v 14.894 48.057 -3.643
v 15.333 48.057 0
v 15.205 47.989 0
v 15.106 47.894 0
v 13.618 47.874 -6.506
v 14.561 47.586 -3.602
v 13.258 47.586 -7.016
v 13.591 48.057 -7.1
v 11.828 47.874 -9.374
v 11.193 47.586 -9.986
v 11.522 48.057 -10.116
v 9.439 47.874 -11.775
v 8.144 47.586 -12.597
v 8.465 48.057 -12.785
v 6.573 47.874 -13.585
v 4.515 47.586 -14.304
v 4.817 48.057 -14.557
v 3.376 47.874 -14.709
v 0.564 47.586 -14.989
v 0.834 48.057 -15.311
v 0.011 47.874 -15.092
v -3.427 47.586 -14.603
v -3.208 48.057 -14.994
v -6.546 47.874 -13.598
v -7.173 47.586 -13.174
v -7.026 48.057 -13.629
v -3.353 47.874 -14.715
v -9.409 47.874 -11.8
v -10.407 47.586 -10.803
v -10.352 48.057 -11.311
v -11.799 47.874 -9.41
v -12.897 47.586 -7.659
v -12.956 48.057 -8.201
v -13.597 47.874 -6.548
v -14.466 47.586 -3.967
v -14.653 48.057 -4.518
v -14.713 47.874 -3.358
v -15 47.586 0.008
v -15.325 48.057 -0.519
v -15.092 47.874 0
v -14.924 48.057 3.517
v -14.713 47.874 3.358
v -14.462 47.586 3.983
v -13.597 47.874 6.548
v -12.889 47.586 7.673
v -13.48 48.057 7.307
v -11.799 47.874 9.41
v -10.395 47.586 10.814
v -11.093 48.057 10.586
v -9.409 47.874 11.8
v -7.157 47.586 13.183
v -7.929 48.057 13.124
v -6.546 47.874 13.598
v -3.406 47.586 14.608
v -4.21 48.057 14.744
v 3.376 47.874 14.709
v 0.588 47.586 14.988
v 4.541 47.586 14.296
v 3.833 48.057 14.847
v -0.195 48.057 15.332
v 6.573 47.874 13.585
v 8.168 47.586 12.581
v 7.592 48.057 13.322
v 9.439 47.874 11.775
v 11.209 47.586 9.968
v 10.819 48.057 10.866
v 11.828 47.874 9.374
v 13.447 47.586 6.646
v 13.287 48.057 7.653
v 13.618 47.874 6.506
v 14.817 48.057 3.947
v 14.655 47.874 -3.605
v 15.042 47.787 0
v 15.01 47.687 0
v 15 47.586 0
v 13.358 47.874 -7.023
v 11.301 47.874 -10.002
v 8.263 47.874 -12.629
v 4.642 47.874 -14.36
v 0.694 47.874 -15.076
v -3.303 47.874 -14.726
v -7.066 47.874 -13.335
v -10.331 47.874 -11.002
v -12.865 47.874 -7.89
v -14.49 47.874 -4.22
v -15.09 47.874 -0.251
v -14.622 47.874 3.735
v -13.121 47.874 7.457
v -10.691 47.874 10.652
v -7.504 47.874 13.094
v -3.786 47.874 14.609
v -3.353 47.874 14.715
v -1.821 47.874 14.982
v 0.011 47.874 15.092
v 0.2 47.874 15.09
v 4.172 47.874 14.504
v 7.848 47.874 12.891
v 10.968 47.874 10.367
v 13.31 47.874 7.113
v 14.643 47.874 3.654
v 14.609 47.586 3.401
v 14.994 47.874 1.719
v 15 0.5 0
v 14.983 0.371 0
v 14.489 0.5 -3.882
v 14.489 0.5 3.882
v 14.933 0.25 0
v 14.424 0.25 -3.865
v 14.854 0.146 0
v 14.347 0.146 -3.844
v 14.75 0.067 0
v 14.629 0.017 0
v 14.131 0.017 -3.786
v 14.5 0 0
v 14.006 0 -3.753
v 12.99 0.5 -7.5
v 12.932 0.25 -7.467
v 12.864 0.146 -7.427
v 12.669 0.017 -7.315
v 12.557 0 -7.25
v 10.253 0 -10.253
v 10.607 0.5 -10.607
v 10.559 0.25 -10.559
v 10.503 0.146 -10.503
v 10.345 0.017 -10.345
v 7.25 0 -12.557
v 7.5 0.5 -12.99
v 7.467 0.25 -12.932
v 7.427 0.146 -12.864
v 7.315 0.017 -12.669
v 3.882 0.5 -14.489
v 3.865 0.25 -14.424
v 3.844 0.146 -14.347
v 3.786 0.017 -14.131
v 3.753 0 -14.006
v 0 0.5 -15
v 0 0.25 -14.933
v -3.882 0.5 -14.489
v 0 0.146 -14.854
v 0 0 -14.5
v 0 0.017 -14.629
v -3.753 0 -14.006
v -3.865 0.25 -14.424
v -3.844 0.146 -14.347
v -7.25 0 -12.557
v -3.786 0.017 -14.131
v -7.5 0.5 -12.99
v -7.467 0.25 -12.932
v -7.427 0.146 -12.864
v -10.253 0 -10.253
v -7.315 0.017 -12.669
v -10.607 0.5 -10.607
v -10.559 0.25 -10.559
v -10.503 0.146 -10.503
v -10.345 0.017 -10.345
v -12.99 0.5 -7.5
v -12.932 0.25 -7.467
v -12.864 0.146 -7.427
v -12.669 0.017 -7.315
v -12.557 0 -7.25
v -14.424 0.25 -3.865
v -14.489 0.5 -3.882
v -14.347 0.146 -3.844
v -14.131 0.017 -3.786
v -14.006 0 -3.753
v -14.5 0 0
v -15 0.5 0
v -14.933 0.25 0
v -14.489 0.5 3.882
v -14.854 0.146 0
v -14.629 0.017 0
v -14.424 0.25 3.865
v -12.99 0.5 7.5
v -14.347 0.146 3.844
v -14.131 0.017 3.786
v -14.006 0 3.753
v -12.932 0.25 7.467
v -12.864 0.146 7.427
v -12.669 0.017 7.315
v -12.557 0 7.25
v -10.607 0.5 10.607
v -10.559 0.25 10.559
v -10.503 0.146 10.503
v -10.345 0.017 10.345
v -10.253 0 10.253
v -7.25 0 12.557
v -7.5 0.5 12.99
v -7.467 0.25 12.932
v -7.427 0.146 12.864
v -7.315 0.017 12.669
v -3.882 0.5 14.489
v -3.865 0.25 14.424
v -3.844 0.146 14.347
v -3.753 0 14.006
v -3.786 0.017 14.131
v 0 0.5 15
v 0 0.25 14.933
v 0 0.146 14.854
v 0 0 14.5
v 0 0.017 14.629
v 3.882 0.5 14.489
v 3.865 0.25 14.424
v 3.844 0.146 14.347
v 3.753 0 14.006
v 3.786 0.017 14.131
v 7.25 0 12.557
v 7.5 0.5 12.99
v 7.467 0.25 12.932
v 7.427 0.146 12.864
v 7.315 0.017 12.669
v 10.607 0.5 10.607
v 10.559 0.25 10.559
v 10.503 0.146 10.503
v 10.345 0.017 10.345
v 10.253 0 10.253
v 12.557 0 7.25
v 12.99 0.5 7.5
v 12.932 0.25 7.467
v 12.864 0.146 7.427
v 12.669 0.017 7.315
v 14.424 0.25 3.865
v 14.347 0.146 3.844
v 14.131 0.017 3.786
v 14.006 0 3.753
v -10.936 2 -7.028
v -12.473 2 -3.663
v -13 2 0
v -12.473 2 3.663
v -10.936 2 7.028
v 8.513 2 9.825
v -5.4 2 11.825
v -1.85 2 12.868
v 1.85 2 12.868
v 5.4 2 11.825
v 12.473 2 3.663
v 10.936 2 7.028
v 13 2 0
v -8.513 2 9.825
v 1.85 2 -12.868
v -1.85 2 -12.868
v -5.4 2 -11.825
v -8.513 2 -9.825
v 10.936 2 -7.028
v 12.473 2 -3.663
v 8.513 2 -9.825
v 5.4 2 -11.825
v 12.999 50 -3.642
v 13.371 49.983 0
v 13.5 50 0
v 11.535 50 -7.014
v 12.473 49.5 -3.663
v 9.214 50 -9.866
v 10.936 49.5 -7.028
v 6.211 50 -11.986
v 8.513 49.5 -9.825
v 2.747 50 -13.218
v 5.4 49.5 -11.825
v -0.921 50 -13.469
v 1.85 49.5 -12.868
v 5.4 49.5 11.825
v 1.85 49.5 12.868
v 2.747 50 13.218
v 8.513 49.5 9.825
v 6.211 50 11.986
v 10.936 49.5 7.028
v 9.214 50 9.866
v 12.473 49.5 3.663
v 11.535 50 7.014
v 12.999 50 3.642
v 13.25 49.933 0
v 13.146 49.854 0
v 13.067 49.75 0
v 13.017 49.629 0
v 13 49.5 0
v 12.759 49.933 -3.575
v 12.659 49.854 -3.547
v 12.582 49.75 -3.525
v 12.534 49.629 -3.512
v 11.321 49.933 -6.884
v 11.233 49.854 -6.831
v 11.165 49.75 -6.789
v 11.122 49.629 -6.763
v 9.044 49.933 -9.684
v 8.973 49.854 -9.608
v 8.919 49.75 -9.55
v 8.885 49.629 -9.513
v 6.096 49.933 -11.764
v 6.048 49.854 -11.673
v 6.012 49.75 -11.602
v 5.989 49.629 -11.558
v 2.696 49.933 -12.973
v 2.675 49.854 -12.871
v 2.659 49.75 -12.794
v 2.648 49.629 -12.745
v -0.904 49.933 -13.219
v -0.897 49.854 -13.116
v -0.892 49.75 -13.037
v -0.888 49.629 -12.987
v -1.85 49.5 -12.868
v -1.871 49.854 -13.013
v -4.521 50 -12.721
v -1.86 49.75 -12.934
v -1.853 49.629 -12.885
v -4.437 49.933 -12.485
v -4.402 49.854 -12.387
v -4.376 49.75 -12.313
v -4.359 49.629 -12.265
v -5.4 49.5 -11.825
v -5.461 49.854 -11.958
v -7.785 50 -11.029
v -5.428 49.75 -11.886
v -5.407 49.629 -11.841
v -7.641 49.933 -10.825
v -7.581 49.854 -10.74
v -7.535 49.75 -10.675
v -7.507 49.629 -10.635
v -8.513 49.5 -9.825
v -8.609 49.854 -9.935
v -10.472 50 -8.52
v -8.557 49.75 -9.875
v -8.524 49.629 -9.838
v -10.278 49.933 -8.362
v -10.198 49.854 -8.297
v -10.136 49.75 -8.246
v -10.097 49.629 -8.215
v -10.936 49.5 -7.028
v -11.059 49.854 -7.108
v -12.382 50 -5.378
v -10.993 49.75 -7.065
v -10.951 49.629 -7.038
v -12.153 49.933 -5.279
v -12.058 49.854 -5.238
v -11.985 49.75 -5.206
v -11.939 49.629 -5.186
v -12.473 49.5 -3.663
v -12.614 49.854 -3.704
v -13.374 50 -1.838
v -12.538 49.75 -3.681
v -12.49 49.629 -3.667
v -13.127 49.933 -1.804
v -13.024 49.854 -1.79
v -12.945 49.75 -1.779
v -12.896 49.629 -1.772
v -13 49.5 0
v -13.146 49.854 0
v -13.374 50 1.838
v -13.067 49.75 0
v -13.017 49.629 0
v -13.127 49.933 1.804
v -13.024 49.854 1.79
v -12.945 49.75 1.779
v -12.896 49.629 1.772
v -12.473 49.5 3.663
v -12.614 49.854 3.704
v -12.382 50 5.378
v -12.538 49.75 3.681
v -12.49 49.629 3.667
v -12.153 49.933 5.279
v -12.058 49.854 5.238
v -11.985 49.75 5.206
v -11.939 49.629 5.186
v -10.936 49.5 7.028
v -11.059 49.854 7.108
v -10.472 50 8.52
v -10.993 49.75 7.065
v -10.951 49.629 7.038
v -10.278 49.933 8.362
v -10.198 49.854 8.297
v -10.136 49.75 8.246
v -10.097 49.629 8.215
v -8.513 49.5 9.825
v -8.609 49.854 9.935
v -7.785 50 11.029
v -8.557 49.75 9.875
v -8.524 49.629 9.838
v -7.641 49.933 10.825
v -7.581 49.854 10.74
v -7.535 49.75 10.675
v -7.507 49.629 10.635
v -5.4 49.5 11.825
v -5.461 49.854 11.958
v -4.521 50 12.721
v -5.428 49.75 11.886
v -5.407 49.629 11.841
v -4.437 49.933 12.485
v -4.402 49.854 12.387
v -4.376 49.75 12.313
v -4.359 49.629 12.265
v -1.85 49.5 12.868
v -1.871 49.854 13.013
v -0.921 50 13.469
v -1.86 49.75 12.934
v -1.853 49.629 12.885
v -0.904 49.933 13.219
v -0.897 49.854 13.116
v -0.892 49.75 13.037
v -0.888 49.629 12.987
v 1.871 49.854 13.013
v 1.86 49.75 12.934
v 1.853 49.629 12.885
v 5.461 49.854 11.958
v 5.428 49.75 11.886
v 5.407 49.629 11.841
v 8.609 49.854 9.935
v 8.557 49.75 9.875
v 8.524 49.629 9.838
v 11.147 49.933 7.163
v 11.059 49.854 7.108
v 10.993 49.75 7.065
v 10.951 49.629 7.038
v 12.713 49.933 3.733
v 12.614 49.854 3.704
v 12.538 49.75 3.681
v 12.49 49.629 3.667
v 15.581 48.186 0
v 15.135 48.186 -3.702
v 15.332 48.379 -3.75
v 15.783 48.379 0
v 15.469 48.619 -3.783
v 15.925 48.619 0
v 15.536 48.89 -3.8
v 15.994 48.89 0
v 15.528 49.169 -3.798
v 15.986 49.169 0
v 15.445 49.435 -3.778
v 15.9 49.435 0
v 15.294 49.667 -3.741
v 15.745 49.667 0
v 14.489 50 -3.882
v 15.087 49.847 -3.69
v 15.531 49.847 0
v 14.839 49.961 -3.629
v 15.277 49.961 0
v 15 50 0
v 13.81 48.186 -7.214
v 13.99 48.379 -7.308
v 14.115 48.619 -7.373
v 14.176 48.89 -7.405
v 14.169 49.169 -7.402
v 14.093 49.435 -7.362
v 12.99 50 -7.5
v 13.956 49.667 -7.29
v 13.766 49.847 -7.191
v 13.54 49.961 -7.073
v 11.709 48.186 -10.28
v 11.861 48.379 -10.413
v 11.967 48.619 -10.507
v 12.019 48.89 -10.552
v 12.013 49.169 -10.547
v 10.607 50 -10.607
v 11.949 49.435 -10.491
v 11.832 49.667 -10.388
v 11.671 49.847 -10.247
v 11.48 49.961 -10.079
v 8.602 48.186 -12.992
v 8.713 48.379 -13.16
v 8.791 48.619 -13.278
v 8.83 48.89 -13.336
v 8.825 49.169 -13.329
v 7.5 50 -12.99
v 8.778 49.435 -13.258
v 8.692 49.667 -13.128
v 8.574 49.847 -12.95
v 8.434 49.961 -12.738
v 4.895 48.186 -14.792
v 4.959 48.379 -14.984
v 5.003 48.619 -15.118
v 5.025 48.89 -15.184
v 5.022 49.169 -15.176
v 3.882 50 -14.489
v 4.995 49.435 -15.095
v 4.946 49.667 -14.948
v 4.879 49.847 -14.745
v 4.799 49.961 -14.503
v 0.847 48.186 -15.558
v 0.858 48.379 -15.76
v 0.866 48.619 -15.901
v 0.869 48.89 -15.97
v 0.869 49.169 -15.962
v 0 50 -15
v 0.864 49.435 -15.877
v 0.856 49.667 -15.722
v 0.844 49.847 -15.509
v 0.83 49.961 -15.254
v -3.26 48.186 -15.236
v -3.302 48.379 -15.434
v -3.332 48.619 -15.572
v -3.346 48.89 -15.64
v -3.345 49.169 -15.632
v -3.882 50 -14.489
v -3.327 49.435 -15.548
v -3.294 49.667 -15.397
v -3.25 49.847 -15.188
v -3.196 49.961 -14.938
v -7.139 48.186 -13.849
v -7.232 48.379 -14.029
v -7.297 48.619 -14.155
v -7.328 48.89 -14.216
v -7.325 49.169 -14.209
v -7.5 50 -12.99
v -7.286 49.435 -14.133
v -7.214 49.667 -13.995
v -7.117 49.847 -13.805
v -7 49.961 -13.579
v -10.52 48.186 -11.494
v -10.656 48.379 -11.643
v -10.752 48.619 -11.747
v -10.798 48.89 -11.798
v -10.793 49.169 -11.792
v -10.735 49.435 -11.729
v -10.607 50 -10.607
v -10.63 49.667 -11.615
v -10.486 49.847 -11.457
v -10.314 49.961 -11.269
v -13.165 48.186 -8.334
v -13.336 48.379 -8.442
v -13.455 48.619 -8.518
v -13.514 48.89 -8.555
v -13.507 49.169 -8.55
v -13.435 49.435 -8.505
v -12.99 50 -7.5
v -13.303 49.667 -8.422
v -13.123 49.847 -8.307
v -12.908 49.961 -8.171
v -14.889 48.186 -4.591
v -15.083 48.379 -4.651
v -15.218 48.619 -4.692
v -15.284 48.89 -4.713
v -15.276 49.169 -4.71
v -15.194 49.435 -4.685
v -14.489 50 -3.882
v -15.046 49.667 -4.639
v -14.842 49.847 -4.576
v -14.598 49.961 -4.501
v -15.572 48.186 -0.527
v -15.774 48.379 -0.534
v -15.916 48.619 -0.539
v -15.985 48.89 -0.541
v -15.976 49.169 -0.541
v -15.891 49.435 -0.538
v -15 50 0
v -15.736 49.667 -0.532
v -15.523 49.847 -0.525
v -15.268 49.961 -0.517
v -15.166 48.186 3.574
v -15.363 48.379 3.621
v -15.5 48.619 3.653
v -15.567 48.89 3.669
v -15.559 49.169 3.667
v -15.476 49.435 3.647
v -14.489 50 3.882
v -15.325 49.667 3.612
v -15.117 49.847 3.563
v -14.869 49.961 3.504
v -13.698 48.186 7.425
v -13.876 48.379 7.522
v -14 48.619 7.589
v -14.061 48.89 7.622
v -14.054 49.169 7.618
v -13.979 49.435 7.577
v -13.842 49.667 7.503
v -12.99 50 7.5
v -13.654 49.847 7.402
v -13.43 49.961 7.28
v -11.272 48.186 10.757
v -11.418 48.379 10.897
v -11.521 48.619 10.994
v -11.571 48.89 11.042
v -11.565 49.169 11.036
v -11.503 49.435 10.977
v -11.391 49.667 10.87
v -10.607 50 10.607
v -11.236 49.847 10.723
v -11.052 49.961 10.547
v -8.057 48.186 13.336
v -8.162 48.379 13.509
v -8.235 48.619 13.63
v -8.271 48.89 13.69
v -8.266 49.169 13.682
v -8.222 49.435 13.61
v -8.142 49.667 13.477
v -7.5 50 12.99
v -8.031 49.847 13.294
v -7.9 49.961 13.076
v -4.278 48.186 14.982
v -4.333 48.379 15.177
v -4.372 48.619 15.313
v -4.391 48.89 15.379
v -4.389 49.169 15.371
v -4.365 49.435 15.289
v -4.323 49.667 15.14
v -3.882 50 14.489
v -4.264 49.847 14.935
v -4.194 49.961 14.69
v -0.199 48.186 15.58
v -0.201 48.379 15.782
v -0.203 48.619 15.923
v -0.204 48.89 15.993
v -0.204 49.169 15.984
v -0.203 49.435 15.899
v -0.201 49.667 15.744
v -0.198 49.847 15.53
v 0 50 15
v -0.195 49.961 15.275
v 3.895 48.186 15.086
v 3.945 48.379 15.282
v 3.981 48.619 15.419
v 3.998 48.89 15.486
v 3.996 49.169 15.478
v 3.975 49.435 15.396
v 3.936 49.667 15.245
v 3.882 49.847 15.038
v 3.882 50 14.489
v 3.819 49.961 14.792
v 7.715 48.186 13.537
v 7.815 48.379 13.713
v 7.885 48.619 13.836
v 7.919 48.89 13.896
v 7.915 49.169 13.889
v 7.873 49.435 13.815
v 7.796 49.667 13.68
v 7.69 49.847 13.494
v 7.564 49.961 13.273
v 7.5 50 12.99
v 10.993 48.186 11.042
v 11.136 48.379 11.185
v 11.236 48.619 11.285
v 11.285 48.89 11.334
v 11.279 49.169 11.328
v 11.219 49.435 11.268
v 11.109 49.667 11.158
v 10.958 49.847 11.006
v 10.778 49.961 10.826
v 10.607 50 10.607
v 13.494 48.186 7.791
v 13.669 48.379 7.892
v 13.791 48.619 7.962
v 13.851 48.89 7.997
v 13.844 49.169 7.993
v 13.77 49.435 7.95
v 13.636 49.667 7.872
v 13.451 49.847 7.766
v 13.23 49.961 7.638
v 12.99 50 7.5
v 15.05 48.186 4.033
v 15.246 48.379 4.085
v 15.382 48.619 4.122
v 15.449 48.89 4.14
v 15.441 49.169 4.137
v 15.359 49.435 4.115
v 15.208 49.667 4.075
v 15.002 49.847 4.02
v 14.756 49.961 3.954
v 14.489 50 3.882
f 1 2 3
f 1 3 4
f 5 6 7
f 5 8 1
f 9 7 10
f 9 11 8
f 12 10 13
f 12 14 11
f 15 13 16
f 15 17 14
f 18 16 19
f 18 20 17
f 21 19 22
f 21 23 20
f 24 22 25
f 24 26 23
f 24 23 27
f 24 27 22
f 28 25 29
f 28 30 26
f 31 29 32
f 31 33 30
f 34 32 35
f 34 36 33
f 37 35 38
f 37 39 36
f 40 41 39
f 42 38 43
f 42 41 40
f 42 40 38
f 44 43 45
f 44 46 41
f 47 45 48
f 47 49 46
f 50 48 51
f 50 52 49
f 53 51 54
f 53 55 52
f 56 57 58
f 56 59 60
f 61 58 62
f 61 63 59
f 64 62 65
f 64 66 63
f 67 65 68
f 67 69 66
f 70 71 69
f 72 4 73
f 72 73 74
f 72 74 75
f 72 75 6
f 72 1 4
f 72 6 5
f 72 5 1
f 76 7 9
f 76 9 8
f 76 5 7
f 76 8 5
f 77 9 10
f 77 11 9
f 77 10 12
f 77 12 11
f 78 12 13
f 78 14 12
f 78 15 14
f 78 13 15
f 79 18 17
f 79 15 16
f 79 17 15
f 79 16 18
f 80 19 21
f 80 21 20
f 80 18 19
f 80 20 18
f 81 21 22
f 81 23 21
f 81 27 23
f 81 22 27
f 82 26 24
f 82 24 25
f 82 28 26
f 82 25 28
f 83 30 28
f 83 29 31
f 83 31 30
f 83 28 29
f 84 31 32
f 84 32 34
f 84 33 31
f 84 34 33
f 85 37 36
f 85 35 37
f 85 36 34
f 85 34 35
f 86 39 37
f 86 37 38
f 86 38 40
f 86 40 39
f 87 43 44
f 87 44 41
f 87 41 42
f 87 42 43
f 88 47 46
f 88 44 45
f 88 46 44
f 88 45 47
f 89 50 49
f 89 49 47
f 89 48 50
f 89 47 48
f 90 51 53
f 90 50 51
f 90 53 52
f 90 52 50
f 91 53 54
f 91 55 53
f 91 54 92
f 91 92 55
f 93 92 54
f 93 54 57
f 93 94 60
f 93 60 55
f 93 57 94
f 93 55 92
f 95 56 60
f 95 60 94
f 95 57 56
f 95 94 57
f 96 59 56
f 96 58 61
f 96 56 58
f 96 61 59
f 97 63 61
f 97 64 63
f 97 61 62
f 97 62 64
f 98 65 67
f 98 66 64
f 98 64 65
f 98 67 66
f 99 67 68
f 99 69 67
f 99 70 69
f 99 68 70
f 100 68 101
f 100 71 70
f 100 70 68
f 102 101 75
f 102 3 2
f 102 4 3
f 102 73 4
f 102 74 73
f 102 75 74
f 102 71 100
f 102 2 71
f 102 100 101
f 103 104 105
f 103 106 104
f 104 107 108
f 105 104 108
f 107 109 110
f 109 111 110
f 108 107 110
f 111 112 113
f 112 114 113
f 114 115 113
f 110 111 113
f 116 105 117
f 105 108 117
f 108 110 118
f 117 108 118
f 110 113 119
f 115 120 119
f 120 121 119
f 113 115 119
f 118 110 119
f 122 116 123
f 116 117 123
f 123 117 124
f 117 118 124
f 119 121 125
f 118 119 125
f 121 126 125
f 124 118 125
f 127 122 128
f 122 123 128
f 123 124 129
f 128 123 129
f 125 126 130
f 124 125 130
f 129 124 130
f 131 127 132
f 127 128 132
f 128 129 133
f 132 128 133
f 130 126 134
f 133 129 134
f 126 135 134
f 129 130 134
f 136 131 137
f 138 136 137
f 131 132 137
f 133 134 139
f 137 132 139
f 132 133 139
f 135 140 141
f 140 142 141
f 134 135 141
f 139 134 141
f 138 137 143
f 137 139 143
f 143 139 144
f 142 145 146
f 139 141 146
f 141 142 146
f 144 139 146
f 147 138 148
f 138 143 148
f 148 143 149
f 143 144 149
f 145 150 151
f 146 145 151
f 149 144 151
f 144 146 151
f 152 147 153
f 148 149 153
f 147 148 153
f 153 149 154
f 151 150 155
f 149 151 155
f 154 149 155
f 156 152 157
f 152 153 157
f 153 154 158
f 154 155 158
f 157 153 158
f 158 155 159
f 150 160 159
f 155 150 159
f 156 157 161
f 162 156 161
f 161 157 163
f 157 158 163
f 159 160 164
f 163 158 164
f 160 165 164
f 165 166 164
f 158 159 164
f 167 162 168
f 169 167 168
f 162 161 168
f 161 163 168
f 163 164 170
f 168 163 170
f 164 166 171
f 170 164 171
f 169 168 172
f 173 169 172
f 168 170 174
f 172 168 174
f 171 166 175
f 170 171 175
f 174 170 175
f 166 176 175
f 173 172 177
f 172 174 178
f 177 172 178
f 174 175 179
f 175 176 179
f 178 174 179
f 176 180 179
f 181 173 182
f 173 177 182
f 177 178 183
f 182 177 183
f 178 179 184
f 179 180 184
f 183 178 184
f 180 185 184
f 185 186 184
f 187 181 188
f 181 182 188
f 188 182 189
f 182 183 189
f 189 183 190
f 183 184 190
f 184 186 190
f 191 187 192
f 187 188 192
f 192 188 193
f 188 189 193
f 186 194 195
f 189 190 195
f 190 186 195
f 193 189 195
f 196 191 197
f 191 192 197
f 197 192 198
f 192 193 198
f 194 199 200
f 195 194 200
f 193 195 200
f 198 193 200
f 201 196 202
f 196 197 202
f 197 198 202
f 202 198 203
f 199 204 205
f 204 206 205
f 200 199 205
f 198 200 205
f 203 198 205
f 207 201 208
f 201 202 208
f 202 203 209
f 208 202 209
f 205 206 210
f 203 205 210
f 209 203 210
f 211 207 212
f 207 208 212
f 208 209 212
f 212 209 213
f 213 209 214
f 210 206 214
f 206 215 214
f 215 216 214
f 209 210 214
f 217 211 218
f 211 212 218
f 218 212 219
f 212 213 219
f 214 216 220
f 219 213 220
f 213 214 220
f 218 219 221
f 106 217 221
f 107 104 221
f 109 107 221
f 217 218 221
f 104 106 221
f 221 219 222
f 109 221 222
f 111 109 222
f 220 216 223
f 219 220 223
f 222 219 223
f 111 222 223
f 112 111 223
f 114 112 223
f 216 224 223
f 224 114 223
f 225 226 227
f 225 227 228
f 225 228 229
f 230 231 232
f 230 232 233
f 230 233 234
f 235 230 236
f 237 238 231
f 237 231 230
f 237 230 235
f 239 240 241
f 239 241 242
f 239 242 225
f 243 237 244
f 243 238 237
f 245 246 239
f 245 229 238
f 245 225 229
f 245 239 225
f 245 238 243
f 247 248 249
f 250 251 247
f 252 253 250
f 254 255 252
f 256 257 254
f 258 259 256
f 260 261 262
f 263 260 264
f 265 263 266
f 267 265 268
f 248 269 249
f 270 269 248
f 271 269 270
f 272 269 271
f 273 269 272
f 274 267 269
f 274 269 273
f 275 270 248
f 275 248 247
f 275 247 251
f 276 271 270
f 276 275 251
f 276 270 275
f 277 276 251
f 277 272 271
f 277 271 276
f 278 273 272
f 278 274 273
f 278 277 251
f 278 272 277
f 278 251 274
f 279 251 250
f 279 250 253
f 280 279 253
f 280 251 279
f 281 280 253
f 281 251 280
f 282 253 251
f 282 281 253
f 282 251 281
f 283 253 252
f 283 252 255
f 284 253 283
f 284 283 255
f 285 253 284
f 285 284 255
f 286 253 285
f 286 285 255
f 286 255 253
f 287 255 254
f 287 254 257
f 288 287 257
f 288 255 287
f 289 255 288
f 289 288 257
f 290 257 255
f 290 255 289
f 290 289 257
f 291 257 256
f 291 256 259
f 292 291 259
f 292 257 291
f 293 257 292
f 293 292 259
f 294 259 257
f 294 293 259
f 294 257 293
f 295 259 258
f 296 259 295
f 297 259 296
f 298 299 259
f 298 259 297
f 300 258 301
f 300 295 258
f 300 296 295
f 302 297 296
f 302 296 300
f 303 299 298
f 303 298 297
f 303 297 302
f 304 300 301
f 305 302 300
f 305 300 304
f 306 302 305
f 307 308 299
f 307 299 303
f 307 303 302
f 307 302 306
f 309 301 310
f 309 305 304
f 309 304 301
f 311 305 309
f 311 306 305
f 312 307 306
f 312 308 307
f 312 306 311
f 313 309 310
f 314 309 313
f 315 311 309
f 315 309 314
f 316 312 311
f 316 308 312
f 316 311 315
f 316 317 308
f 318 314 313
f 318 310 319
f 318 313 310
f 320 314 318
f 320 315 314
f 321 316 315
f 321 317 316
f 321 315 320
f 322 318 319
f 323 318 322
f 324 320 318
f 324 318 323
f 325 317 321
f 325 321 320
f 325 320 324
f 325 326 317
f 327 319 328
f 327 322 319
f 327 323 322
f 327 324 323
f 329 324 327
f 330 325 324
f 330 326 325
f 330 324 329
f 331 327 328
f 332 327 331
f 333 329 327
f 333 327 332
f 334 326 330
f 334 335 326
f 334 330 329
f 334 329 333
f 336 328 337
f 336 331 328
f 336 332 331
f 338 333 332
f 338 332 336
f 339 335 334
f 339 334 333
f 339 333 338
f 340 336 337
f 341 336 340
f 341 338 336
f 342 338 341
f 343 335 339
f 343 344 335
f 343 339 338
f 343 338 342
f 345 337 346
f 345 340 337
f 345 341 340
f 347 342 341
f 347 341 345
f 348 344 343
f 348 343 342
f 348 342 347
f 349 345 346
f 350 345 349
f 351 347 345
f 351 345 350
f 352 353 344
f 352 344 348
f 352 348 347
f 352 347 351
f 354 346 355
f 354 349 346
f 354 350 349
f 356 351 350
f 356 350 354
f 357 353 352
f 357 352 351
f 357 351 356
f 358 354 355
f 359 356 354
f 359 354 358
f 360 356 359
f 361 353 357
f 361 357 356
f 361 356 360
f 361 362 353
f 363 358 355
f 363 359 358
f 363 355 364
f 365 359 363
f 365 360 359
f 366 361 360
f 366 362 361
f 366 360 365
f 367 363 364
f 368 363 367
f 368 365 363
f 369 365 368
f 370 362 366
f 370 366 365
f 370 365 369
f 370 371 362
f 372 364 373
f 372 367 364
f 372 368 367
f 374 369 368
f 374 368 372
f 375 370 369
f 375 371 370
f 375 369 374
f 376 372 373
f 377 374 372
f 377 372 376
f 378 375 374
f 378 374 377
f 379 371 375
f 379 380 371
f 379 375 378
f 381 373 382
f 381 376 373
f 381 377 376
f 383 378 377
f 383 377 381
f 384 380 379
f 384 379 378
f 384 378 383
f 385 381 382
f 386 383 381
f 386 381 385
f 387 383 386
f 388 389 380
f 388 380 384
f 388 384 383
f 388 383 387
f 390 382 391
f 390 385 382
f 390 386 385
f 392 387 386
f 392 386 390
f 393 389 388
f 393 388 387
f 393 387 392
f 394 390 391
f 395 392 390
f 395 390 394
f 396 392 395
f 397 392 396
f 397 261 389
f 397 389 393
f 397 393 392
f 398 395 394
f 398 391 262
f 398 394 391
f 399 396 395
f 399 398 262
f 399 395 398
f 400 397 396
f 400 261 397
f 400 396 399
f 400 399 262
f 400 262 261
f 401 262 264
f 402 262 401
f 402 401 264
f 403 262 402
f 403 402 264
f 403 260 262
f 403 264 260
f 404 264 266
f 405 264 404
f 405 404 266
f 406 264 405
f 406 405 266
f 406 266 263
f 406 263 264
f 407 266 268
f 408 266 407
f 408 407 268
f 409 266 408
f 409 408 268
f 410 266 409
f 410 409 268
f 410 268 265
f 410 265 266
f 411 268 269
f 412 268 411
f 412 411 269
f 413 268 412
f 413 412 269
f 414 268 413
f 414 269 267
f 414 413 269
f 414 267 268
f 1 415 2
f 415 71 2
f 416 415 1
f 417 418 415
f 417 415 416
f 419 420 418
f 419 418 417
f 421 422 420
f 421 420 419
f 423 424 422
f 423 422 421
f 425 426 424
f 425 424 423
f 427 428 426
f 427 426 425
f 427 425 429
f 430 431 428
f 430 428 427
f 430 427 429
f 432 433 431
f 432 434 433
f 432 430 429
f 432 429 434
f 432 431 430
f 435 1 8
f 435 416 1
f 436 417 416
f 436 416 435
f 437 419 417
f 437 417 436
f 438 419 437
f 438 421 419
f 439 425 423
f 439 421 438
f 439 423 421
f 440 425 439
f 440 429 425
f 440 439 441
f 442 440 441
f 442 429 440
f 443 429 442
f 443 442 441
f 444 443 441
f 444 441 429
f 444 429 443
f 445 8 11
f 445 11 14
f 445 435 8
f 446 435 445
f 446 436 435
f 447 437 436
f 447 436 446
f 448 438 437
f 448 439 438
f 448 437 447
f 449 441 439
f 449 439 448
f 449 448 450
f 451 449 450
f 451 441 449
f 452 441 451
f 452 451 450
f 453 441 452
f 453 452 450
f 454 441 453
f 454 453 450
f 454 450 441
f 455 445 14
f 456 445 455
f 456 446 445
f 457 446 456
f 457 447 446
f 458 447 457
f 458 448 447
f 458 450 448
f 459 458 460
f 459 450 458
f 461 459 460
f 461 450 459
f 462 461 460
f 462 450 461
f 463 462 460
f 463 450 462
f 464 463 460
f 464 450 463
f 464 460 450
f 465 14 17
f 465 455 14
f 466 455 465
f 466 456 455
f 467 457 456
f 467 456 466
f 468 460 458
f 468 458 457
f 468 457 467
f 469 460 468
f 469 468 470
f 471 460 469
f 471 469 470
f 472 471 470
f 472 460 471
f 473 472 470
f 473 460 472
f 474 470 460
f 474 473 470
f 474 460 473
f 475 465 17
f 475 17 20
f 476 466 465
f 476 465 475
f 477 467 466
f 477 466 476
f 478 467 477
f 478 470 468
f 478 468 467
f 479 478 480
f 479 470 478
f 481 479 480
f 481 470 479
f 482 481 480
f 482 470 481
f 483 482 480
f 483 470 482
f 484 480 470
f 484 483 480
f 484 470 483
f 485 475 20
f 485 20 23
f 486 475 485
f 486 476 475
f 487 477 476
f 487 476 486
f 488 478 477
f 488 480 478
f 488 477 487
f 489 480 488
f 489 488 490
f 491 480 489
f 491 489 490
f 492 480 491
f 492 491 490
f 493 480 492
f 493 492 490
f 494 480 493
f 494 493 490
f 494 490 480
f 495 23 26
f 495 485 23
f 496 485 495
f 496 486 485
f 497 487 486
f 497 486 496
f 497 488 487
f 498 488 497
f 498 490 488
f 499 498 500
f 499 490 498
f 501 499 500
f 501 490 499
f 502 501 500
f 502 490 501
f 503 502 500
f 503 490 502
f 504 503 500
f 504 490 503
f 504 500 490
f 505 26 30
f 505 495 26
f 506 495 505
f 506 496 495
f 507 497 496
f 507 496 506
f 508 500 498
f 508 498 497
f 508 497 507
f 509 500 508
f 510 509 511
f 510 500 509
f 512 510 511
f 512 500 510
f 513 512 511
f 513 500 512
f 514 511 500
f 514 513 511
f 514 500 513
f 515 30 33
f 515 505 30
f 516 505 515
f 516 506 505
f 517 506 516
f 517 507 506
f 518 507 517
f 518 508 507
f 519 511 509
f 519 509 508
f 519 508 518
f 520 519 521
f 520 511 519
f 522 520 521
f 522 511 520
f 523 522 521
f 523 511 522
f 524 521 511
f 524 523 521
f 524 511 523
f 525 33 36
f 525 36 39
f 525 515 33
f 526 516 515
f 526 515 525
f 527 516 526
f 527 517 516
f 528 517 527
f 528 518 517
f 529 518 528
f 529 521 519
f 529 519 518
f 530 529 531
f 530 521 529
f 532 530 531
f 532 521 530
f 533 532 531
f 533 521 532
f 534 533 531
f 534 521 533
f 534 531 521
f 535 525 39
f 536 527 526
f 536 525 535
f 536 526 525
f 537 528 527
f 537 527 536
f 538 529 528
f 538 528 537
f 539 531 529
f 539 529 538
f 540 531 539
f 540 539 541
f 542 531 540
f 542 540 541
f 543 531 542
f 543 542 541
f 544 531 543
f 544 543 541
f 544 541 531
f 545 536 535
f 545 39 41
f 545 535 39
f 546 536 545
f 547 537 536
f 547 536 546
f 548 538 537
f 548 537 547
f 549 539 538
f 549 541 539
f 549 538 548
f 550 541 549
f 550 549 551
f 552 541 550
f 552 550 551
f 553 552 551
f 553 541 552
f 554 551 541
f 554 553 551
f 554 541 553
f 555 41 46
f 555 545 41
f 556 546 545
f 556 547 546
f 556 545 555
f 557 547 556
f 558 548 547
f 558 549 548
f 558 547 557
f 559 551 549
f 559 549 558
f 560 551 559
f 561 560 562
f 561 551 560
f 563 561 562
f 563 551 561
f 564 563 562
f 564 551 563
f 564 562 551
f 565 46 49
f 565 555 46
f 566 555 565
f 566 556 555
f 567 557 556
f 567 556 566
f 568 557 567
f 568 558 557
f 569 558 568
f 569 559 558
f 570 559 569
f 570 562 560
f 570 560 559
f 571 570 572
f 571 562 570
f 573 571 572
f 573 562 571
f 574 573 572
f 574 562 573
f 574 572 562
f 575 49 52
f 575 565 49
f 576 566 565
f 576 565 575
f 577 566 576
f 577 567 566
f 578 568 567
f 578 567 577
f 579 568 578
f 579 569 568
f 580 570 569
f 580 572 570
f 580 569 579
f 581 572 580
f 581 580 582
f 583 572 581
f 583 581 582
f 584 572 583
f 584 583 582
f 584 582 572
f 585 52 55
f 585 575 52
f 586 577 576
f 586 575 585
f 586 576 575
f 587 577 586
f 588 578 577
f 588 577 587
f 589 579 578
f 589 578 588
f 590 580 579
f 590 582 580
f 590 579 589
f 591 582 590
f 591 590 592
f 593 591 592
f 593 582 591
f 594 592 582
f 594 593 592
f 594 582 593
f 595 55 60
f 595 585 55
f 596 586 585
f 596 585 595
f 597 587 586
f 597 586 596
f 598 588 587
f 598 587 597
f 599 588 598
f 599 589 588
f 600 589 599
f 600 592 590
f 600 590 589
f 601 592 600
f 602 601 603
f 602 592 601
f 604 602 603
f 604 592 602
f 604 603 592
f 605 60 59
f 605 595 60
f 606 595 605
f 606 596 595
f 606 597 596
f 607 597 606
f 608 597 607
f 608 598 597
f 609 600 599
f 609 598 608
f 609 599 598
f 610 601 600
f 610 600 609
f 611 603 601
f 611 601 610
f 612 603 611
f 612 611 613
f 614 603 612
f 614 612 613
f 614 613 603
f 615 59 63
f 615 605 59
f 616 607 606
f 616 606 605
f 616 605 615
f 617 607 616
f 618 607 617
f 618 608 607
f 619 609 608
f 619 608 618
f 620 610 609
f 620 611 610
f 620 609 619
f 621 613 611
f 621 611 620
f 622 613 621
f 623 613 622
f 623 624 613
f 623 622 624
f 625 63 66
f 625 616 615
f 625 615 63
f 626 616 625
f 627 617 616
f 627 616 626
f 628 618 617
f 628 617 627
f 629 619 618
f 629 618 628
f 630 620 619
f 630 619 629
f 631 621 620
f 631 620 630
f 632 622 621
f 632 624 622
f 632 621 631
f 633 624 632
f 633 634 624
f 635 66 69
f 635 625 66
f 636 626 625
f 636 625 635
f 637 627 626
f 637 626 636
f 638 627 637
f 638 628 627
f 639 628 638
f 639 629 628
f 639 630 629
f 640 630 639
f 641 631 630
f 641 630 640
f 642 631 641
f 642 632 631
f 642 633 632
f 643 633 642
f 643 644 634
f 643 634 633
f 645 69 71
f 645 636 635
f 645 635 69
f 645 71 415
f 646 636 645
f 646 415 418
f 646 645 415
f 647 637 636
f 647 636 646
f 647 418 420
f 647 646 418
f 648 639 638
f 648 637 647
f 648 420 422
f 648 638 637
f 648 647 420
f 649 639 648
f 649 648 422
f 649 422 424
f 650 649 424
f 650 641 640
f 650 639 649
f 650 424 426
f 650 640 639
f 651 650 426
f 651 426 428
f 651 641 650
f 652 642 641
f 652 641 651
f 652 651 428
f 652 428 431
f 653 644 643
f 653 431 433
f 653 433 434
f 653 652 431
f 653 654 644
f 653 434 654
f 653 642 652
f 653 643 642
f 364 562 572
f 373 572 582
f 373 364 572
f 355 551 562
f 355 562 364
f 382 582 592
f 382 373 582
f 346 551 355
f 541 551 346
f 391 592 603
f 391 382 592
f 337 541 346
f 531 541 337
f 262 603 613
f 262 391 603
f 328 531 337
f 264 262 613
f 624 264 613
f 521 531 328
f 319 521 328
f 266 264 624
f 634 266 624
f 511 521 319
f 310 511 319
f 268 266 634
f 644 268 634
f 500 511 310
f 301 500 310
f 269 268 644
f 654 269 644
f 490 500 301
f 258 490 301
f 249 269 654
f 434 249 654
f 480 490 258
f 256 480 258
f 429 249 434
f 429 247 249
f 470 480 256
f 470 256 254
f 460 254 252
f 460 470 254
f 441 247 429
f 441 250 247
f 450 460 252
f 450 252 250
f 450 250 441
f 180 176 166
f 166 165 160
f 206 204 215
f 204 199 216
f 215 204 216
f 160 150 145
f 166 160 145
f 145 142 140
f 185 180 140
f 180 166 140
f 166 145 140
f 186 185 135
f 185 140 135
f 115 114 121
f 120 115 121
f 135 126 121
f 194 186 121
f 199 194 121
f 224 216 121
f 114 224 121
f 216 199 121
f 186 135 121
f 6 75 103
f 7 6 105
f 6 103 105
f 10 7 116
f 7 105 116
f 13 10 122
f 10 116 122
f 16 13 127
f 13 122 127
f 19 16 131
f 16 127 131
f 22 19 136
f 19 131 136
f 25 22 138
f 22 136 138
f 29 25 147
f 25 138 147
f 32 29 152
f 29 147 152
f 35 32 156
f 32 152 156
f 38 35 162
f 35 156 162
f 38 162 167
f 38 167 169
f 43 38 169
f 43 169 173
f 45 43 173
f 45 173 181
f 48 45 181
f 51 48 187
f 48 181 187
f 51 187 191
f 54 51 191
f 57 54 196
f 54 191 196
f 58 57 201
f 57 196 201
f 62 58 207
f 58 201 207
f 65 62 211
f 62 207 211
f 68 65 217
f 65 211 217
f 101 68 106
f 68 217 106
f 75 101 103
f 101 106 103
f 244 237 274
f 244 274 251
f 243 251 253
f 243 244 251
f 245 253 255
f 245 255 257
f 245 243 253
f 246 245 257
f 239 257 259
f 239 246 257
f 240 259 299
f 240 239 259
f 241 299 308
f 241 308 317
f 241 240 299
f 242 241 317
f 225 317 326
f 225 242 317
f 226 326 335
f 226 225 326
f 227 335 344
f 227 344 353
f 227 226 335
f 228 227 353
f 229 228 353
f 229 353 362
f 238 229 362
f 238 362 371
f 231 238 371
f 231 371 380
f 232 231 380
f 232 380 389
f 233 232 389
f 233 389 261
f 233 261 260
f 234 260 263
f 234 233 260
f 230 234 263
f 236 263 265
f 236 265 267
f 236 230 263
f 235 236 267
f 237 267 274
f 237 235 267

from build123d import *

# Parameters (mm, degrees)
BASE_R              = 15
BOSS_EXTRUDE1_DEPTH = 2
SKETCH2_R           = 15
SKETCH2_R_2         = 13
BOSS_EXTRUDE2_DEPTH = 48
FILLET1_R           = 0.5
FILLET2_R           = 0.5
FILLET4_R           = 0.5


with BuildPart() as part:
    # Base → Boss-Extrude1 (new body)
    with BuildSketch(Plane(origin=(0, 0, 0), x_dir=(1, 0, 0), z_dir=(0, 1, 0))):
        Circle(BASE_R)
    extrude(amount=BOSS_EXTRUDE1_DEPTH)

    # Sketch2 → Boss-Extrude2 (add)
    with BuildSketch(Plane(origin=(0, 2, 0), x_dir=(1, 0, 0), z_dir=(0, 1, 0))):
        Circle(SKETCH2_R)
        Circle(SKETCH2_R_2, mode=Mode.SUBTRACT)
    extrude(amount=BOSS_EXTRUDE2_DEPTH)

    # Sketch4 → Revolve3 (revolve)
    with BuildSketch(Plane.XY):
        with BuildLine():
            Line((15, 50), (15, 48))
            ThreePointArc((15, 48), (16, 49), (15, 50))
        make_face()
    revolve(axis=Axis((0, 0, 0), (0, 1, 0)))

    # Fillet1
    fillet1_edges = [part.edges().sort_by_distance(p)[0] for p in [
        (-15, 0, 0),
    ]]
    fillet(fillet1_edges, radius=FILLET1_R)

    # Fillet2
    fillet2_edges = [part.edges().sort_by_distance(p)[0] for p in [
        (-13, 50, 0),
    ]]
    fillet(fillet2_edges, radius=FILLET2_R)

    # Fillet4
    fillet4_edges = [part.edges().sort_by_distance(p)[0] for p in [
        (-15, 48, 0),
    ]]
    fillet(fillet4_edges, radius=FILLET4_R)


solid = part.part
